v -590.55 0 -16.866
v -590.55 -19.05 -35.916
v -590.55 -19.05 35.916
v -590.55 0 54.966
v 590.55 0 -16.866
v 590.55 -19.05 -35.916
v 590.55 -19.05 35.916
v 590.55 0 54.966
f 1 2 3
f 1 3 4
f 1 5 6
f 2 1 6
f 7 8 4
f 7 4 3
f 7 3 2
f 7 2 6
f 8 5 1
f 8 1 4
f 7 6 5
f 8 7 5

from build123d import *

# Parameters (mm, degrees)
F0_W     = 1181.1
F0_H     = 71.8312
F1_DEPTH = 19.05
F3_DEPTH = 1181.101
F5_DEPTH = 1181.1


with BuildPart() as f1:
    # F0 (on Front) → F1 (new body)
    with BuildSketch(Plane.XZ):
        Rectangle(F0_W, F0_H)
    extrude(amount=F1_DEPTH)

    # F2 (on face) → F3 (cut, through all)
    with BuildSketch(Plane.YZ.offset(590.55)):
        Polygon((0, -16.8656), (-19.05, -35.9156), (0, -35.9156), align=None)
    extrude(amount=-F3_DEPTH, mode=Mode.SUBTRACT)

    # F4 (on face) → F5 (join)
    with BuildSketch(Plane.YZ.offset(590.55)):
        Polygon((0, 54.9656), (-19.05, 35.9156), (0, 35.9156), align=None)
    extrude(amount=-F5_DEPTH)


solid = f1.part
